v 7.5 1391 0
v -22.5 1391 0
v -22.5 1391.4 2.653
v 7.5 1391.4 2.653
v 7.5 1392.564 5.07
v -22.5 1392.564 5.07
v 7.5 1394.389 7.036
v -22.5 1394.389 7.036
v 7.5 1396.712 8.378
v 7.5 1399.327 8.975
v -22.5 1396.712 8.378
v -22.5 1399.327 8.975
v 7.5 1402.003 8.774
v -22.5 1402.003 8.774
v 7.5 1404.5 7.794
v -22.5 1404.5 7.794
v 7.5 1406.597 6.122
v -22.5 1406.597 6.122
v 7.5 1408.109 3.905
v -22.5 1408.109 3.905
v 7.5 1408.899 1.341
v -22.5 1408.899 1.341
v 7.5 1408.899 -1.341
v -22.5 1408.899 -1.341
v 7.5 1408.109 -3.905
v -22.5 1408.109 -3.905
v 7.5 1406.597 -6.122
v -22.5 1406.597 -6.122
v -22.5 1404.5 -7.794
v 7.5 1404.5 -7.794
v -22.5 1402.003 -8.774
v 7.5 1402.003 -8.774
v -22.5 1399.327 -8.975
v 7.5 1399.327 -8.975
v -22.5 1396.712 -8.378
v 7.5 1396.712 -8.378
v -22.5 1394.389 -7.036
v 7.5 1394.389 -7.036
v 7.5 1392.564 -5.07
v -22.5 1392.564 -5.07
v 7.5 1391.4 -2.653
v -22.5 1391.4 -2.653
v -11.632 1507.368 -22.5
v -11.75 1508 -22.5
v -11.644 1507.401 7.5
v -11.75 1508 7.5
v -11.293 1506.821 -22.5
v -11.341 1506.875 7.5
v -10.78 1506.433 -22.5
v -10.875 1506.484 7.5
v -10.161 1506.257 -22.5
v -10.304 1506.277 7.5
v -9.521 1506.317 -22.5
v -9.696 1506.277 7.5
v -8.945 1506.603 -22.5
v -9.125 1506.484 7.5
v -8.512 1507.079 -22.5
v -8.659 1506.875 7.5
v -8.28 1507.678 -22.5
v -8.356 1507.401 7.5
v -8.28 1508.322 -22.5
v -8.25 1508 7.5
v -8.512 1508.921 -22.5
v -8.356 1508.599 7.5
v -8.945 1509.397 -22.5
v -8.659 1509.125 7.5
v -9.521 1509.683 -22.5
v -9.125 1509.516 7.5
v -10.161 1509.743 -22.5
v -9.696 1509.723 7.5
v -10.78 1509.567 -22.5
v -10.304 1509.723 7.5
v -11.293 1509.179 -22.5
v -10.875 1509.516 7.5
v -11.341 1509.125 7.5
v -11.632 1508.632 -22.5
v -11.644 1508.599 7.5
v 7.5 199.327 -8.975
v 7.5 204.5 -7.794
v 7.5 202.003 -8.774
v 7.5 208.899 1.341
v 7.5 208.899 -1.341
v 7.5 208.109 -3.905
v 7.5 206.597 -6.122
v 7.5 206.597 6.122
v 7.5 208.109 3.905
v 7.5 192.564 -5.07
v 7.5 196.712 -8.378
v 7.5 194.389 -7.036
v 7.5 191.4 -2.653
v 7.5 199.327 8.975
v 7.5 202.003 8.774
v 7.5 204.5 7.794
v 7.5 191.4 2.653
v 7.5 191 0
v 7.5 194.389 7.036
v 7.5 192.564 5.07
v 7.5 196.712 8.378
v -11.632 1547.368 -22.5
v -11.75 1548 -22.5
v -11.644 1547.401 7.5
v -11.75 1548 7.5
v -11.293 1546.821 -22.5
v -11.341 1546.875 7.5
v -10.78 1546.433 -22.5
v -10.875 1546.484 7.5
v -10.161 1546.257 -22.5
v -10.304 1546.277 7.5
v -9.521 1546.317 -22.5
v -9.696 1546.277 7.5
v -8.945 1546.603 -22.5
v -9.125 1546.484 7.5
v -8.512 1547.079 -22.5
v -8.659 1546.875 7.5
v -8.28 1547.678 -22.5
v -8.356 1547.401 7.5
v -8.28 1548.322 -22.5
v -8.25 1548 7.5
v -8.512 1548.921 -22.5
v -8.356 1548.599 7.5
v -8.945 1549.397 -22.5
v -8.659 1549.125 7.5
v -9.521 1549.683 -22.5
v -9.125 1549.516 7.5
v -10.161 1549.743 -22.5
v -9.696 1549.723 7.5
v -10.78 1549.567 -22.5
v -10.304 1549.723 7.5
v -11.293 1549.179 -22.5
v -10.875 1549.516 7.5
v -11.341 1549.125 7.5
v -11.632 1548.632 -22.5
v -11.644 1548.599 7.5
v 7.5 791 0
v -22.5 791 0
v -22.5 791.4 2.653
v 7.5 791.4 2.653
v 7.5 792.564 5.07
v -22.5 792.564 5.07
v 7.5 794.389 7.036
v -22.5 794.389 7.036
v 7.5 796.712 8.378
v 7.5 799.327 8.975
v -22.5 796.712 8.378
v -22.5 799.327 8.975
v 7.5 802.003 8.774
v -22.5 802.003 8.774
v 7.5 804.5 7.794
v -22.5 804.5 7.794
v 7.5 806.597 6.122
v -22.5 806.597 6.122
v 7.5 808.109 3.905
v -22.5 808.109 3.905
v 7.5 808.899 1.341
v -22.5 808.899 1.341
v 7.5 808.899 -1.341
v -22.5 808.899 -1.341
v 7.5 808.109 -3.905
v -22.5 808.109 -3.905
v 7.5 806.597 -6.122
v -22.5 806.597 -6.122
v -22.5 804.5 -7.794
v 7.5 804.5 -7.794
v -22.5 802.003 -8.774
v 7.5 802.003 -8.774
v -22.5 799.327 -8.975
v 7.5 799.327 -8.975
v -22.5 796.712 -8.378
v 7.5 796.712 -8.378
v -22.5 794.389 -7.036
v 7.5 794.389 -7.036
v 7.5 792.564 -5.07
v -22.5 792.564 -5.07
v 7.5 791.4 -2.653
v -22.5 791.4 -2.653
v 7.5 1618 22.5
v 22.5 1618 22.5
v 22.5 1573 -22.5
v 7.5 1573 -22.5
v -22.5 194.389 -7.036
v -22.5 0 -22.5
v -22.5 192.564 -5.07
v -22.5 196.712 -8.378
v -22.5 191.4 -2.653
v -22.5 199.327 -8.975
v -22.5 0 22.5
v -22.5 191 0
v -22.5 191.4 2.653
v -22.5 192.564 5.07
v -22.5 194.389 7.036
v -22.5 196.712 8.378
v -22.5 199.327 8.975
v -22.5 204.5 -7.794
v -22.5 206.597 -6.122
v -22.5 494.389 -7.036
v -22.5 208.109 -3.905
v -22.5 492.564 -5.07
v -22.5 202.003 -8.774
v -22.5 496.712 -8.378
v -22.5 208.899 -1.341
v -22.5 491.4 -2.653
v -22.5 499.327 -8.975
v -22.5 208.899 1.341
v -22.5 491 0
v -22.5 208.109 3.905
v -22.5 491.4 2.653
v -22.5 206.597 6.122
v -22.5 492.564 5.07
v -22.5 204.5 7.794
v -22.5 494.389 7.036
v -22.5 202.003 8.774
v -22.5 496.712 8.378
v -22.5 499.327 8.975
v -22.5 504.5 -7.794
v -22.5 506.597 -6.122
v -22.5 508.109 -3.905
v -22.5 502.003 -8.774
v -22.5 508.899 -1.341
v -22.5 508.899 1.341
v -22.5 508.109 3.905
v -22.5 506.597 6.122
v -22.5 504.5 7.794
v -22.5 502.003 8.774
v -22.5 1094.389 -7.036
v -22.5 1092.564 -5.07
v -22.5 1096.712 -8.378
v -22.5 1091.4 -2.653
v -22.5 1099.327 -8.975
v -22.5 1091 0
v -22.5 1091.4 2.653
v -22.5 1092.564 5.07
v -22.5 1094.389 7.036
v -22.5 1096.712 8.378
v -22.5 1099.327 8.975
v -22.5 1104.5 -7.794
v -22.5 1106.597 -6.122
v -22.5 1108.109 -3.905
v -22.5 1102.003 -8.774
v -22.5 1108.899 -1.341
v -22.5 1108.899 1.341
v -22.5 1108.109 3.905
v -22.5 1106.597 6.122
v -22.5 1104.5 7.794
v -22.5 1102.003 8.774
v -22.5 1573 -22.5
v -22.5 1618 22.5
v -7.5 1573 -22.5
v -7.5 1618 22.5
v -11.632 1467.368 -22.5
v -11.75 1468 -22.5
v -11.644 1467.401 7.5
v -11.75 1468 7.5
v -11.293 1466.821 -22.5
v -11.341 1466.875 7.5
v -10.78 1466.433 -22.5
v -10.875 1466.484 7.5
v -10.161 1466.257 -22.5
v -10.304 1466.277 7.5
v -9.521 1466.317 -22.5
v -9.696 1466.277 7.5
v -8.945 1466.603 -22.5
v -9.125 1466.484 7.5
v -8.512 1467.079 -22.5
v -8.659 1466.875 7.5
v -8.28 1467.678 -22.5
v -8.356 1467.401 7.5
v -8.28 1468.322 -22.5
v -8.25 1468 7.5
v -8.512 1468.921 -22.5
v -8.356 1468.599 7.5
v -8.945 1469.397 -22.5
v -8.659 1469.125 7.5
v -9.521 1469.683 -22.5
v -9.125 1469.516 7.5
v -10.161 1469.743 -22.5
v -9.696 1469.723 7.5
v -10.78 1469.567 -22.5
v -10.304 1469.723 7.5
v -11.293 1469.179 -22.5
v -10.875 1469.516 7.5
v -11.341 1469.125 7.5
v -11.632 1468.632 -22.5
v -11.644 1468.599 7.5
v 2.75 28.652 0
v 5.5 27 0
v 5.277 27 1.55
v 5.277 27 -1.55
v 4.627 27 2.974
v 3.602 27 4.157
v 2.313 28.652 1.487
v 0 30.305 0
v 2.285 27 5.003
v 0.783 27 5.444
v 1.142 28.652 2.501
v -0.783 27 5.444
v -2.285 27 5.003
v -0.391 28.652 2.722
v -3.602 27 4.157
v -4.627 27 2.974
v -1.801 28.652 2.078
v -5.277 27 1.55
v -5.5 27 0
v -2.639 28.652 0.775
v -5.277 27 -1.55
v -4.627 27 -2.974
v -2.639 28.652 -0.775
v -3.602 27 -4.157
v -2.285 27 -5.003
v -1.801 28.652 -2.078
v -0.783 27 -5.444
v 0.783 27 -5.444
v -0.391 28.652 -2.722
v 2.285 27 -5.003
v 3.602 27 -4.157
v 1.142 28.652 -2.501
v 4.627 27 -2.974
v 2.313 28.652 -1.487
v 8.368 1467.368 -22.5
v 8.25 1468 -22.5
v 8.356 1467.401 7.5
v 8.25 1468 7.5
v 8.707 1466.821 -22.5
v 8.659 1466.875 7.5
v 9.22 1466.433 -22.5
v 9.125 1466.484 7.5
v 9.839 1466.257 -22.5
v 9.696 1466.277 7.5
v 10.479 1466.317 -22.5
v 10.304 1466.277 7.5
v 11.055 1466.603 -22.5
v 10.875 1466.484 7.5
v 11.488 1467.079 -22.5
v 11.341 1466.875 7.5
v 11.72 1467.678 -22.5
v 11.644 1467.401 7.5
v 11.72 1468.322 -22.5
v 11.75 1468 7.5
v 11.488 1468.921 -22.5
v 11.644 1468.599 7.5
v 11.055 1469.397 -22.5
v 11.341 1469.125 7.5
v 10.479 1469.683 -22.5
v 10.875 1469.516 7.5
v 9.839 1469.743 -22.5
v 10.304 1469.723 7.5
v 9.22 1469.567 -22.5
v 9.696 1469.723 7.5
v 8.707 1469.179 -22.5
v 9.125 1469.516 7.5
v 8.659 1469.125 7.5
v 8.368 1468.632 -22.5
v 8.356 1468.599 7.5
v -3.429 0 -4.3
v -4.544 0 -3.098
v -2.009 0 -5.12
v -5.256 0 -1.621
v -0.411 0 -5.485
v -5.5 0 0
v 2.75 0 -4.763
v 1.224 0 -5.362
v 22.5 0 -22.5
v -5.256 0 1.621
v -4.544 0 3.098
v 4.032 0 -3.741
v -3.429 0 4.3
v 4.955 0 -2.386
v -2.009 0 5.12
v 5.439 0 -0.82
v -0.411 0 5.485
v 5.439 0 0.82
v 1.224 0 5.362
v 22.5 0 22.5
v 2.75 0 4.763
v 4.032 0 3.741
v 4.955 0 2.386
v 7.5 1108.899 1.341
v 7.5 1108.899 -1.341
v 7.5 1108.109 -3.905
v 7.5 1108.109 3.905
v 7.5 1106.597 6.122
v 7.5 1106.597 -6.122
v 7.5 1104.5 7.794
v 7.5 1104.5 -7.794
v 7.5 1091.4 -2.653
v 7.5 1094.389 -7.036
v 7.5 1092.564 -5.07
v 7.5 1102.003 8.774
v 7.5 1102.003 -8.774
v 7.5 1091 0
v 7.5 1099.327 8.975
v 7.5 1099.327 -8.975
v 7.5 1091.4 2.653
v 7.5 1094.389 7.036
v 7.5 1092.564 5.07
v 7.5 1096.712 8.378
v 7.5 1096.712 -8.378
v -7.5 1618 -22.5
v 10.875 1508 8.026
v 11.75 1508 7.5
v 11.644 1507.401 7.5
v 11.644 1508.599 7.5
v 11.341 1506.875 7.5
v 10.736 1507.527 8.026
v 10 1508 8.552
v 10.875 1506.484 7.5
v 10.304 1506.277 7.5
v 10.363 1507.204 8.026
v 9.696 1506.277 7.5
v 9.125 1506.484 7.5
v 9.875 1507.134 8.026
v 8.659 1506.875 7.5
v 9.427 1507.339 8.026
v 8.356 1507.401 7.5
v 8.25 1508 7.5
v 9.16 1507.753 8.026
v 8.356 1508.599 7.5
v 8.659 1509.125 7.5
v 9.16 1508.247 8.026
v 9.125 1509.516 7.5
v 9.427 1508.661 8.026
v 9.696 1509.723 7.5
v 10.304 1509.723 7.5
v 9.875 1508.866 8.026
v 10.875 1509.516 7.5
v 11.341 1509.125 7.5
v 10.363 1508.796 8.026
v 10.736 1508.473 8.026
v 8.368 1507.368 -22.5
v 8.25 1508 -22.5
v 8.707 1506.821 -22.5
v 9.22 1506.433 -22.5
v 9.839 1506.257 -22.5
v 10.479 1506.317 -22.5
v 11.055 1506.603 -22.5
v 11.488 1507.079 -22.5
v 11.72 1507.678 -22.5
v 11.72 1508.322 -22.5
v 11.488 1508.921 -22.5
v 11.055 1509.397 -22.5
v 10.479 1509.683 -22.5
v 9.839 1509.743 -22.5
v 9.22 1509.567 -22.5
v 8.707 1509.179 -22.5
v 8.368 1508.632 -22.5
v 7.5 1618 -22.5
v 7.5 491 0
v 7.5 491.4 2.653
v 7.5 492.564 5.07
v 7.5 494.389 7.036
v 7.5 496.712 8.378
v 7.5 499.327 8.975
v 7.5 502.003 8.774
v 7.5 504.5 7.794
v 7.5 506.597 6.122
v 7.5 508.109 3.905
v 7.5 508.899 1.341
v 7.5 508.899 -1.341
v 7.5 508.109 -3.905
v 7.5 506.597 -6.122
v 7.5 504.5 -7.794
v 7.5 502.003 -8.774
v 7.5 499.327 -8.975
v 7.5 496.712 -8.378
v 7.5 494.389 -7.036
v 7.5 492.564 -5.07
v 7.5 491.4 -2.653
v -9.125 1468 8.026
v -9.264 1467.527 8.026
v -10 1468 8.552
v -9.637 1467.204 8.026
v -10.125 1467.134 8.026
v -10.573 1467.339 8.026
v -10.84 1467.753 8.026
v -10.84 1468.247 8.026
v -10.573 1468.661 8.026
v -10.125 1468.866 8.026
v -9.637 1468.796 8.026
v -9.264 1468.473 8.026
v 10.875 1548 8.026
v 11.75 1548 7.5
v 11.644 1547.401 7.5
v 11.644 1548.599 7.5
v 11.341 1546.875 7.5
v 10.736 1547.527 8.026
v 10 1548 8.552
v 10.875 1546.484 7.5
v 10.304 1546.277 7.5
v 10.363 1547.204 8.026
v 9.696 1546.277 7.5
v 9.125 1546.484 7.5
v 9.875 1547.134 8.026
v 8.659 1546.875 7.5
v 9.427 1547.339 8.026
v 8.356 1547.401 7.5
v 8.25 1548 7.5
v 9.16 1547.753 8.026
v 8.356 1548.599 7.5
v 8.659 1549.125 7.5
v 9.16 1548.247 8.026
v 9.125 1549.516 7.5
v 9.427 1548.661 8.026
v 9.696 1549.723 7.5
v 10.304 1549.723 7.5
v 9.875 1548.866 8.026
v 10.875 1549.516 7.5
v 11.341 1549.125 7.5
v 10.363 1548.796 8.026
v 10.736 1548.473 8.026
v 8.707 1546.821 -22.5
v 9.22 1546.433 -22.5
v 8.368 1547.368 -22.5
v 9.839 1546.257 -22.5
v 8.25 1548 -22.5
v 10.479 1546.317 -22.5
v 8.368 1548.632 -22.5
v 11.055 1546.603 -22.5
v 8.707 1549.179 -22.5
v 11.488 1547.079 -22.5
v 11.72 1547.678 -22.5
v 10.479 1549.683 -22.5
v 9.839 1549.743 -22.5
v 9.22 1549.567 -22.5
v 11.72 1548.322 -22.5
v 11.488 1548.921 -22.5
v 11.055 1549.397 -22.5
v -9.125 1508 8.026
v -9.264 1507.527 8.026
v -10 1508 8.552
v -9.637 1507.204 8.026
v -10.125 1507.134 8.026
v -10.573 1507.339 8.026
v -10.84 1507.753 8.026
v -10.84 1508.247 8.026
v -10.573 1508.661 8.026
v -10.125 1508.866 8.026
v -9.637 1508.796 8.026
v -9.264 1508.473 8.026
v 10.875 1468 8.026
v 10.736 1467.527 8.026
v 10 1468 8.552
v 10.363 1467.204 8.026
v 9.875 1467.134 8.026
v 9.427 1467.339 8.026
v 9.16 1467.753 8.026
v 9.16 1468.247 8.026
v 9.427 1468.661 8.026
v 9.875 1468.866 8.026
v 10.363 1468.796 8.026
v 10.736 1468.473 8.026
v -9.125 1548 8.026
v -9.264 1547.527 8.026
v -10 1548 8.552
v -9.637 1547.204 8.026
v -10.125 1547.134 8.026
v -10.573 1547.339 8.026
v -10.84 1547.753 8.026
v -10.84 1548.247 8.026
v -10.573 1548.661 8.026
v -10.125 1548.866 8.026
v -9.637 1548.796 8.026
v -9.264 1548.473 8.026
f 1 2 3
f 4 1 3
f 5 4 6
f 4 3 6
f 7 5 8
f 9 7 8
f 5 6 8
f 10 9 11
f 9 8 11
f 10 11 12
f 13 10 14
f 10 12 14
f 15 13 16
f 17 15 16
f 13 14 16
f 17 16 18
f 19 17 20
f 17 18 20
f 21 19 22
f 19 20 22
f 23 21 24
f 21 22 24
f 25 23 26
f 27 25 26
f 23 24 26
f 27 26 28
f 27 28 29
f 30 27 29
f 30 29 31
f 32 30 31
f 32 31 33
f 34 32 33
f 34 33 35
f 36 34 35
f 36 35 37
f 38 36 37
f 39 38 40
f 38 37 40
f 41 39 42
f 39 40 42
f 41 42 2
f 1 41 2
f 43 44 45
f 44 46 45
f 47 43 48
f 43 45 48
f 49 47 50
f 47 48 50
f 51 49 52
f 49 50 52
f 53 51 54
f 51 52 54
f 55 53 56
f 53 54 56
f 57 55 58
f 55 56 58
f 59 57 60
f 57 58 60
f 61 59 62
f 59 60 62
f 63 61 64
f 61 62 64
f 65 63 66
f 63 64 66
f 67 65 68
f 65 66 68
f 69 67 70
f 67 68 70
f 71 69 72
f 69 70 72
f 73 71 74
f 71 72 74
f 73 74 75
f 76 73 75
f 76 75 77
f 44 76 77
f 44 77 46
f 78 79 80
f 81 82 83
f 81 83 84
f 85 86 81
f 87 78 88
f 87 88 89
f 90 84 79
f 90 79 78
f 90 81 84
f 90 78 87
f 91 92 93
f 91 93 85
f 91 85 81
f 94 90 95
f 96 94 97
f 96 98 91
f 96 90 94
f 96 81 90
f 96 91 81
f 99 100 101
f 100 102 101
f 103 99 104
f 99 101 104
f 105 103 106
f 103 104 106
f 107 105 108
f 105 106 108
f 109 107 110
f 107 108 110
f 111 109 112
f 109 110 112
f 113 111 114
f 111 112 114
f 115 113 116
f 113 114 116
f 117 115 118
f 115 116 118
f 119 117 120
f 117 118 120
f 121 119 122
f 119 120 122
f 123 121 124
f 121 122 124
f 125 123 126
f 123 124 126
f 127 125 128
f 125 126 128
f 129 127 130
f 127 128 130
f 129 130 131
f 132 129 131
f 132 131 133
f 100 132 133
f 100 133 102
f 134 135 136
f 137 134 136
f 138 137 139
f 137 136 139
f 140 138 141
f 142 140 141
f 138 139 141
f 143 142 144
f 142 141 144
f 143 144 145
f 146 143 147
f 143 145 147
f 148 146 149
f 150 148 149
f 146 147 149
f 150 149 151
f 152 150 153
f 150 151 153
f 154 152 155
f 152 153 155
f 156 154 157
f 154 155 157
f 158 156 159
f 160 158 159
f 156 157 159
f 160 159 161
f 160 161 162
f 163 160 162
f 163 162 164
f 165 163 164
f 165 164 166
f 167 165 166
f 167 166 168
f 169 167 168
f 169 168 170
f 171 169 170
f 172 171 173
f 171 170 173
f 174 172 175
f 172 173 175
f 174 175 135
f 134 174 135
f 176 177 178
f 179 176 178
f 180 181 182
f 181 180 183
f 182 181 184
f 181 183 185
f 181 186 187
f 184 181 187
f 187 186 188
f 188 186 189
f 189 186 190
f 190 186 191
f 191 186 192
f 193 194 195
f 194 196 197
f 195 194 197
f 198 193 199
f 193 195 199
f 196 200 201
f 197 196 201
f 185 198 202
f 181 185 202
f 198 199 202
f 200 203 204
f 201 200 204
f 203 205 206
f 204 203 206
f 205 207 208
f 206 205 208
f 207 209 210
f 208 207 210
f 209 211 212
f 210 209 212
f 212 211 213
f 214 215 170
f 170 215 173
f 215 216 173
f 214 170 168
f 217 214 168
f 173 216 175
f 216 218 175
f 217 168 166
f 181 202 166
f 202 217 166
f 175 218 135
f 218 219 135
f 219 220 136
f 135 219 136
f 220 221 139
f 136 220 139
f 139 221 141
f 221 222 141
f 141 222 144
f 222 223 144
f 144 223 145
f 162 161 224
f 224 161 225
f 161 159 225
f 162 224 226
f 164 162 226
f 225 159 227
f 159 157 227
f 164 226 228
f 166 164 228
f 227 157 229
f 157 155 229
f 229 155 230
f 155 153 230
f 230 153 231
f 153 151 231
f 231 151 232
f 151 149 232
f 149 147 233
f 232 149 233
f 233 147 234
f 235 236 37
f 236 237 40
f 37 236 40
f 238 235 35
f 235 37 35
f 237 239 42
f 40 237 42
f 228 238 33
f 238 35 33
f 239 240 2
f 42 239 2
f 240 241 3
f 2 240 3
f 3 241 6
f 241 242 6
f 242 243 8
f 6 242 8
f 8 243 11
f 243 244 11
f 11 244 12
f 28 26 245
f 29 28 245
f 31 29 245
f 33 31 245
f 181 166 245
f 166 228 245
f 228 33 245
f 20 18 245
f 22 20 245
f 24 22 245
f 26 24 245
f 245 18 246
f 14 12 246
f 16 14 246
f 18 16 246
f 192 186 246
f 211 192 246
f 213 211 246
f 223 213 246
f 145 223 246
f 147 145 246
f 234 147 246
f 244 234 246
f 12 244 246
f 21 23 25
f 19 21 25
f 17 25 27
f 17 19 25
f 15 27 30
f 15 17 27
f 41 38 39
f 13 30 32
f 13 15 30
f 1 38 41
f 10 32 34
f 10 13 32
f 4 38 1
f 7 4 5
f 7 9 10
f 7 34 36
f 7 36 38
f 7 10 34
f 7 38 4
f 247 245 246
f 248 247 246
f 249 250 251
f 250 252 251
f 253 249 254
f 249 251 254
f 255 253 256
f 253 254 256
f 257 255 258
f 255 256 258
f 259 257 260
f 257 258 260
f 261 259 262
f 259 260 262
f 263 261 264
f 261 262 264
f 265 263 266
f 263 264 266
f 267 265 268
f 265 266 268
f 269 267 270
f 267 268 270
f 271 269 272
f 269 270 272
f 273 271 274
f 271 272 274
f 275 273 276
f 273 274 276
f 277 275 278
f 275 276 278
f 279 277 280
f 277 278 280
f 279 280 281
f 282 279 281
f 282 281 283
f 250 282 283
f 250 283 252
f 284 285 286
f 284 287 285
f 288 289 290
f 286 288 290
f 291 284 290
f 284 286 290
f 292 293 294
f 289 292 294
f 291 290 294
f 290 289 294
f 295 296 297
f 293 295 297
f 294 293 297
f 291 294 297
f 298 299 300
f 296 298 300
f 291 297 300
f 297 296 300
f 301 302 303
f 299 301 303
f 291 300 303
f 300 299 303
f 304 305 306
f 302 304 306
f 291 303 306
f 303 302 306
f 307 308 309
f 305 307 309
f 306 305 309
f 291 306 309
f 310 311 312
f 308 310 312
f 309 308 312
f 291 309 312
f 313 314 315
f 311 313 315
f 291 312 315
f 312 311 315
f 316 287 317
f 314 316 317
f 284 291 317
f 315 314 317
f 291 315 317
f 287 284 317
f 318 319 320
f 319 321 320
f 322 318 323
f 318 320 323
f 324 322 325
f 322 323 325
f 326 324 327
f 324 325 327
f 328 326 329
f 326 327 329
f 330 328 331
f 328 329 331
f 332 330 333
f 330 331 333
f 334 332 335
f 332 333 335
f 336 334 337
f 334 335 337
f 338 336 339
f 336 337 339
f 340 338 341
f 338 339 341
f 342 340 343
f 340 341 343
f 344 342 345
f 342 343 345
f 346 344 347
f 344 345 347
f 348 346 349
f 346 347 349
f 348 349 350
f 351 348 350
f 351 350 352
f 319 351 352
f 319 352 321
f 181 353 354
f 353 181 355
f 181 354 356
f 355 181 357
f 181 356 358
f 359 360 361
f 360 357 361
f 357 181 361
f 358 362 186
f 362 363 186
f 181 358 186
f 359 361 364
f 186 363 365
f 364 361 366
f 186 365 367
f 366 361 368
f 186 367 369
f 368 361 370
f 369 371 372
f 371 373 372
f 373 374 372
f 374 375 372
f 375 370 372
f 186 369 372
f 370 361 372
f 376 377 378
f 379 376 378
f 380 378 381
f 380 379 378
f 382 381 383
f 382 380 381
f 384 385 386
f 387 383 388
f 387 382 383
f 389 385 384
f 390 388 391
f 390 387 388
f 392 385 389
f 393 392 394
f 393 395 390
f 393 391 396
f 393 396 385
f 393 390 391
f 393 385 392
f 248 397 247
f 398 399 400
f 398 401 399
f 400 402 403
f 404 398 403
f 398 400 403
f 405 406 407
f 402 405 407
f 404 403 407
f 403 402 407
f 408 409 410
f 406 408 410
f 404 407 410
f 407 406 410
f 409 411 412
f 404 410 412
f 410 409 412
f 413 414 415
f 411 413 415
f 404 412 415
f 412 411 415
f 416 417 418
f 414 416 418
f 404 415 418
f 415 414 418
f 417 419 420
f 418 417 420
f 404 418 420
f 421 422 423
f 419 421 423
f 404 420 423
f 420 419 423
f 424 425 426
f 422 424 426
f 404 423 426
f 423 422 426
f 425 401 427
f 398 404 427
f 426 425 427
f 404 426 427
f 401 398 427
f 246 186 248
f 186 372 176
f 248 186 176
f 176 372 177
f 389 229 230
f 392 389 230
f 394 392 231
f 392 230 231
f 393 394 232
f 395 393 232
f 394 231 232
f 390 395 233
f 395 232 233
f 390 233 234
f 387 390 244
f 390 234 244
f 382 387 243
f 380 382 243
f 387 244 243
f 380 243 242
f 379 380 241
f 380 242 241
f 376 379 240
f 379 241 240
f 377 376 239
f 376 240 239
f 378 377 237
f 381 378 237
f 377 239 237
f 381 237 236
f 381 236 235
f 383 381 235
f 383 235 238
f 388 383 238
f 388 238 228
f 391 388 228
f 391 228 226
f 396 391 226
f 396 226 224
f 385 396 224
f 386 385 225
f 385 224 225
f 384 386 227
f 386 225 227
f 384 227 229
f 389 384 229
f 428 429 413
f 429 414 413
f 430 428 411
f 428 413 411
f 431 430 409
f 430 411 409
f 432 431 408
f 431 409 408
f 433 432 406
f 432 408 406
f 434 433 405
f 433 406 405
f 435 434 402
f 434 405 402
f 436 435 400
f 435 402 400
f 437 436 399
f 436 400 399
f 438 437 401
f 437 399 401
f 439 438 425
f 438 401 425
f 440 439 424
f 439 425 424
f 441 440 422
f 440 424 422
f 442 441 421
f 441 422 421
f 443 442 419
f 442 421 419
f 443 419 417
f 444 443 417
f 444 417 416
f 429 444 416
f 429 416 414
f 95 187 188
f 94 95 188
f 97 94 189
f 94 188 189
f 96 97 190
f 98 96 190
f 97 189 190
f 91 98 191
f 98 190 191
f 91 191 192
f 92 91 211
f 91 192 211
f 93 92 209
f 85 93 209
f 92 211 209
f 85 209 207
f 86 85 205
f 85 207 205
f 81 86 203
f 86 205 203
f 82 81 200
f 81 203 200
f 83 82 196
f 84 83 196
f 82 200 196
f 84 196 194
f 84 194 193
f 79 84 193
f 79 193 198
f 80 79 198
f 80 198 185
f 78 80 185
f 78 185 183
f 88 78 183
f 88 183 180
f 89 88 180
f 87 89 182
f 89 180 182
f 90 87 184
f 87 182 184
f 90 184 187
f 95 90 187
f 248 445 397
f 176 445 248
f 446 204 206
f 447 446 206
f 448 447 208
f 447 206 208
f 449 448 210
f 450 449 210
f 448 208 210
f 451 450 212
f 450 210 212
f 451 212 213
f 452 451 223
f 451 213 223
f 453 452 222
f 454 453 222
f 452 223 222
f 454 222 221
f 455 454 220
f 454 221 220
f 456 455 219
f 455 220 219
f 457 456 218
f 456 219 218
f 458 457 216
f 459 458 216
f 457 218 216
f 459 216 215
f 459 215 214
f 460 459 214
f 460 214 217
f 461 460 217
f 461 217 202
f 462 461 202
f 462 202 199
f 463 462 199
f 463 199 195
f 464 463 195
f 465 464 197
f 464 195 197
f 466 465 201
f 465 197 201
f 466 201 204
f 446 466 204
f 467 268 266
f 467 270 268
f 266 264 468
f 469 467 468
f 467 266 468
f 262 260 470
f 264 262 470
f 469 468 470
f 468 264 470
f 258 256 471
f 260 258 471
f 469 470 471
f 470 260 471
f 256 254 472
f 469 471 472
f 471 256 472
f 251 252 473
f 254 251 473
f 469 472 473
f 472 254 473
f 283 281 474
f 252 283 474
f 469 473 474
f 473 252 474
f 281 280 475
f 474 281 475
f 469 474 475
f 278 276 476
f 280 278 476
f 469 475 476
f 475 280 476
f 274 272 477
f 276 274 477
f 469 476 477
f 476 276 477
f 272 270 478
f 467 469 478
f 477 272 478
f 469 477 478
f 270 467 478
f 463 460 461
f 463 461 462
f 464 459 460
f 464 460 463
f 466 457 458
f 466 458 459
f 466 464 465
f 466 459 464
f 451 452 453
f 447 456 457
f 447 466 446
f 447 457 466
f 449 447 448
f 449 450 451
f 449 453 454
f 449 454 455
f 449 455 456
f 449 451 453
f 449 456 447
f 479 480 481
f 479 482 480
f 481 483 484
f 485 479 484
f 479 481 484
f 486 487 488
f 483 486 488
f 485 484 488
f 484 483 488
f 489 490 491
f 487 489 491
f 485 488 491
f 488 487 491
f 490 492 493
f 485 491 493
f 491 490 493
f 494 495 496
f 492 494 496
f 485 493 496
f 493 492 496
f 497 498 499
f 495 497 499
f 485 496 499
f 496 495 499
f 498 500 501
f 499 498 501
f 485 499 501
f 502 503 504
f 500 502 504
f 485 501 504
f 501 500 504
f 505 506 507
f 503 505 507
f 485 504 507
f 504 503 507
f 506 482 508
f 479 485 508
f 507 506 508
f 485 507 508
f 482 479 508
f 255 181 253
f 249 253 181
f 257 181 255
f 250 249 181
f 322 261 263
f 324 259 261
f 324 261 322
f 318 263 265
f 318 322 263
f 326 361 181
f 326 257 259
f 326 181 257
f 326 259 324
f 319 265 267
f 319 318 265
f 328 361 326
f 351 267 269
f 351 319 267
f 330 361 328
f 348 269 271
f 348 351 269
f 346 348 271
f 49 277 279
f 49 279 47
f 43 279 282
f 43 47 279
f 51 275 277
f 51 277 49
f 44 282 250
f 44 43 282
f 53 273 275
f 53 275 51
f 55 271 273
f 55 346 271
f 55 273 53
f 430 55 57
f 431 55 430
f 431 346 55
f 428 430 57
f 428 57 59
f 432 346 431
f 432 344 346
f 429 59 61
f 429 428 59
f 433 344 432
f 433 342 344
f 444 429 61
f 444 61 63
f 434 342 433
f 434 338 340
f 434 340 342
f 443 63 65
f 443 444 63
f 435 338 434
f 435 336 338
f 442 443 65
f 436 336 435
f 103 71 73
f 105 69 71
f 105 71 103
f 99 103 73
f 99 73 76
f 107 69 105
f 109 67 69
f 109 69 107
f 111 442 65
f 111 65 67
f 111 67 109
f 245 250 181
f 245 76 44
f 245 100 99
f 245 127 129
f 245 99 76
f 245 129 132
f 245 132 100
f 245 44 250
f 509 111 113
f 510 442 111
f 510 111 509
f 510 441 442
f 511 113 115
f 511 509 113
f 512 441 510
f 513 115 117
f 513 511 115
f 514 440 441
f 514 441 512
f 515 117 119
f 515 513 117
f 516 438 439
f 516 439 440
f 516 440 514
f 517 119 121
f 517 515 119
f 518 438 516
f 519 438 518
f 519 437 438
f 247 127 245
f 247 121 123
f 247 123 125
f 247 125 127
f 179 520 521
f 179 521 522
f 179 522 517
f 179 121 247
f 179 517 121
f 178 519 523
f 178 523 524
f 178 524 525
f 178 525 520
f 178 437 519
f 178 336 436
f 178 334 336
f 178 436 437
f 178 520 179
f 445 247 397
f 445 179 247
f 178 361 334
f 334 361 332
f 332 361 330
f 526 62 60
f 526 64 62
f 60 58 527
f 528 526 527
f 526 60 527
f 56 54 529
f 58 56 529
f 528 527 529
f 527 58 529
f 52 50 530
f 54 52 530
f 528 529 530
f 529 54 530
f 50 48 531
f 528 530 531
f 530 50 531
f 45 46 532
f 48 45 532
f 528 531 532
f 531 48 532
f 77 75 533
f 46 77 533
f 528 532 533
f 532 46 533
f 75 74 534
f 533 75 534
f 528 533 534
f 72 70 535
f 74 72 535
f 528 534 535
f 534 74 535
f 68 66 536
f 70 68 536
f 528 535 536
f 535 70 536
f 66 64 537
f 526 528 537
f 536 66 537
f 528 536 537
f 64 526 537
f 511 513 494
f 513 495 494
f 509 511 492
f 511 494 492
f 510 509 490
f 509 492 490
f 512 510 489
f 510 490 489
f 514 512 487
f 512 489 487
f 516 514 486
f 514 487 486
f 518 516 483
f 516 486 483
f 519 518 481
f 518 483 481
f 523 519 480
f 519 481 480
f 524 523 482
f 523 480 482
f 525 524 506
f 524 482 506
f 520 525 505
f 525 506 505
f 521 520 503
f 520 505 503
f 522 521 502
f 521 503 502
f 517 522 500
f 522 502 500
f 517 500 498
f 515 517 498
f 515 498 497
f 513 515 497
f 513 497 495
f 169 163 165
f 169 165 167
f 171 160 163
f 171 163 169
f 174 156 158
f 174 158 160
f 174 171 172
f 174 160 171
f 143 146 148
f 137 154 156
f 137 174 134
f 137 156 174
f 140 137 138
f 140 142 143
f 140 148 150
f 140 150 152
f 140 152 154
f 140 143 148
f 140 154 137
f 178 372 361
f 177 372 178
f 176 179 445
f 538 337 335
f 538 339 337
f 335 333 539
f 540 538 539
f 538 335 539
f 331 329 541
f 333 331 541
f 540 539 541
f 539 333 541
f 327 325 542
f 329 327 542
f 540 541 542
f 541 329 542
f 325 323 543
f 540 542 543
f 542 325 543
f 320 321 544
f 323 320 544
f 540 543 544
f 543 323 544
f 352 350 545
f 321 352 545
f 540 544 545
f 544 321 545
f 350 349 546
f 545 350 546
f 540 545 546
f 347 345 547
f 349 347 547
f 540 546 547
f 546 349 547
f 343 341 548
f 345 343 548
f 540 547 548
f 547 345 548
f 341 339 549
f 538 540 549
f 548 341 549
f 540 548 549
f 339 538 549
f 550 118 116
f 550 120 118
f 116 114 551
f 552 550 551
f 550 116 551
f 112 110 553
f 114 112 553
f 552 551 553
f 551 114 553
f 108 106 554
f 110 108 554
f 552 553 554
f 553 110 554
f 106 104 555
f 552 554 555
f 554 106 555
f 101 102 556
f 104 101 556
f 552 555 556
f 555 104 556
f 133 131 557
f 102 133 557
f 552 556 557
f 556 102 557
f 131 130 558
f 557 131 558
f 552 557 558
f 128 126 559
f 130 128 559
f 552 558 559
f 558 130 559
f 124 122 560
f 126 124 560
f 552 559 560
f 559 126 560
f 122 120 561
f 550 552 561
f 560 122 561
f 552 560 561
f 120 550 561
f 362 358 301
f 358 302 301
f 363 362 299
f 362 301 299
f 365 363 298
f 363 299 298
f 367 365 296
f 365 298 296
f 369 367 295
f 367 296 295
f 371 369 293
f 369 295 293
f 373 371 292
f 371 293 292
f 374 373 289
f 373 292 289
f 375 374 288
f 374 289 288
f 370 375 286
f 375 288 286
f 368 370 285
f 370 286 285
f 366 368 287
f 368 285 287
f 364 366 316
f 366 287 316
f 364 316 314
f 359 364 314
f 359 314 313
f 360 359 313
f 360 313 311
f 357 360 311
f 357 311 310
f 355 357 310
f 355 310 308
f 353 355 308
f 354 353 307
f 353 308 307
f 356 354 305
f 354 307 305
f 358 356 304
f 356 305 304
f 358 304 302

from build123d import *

# Parameters (mm, degrees)
F0_W      = 1618
F0_H      = 45
F1_DEPTH  = 22.5
F3_D      = 11
F3_DEPTH  = 27
F3_TIP    = 3.3047334047
F5_DEPTH  = 15
F7_DEPTH  = 15
F8_R      = 9
F9_DEPTH  = 30
F11_D     = 3.5
F11_DEPTH = 30
F11_TIP   = 1.0515060833


with BuildPart() as f1:
    # F0 (on Right) → F1 (new body, symmetric)
    with BuildSketch(Plane.YZ):
        with Locations((809, 0)):
            Rectangle(F0_W, F0_H)
    extrude(amount=F1_DEPTH, both=True)

    # F3
    with Locations(Plane.XZ):
        with Locations((0, 0)):
            Hole(F3_D / 2, depth=F3_DEPTH)
            with Locations((0, 0, -(F3_DEPTH + F3_TIP / 2))):  # 118° drill point
                Cone(0, F3_D / 2, F3_TIP, mode=Mode.SUBTRACT)

    # F4 (on face) → F5 (cut)
    with BuildSketch(Plane.YZ.offset(22.5)):
        Polygon((1618, -22.5), (1618, 22.5), (1573, -22.5), align=None)
    extrude(amount=-F5_DEPTH, mode=Mode.SUBTRACT)

    # F6 (on face) → F7 (cut)
    with BuildSketch(Plane(origin=(-22.5, 0, 0), x_dir=(0, -1, 0), z_dir=(-1, 0, 0))):
        Polygon((-1573, -22.5), (-1618, 22.5), (-1618, -22.5), align=None)
    extrude(amount=-F7_DEPTH, mode=Mode.SUBTRACT)

    # F8 (on face) → F9 (cut)
    with BuildSketch(Plane(origin=(-22.5, 0, 0), x_dir=(0, -1, 0), z_dir=(-1, 0, 0))):
        with Locations((-200, 0)):
            Circle(F8_R)
        with Locations((-500, 0)):
            Circle(F8_R)
        with Locations((-800, 0)):
            Circle(F8_R)
        with Locations((-1100, 0)):
            Circle(F8_R)
        with Locations((-1400, 0)):
            Circle(F8_R)
    extrude(amount=-F9_DEPTH, mode=Mode.SUBTRACT)

    # F11
    with Locations(Plane(origin=(0, 0, -22.5), x_dir=(1, 0, 0), z_dir=(0, 0, -1))):
        with Locations((10, -1548), (10, -1508), (10, -1468), (-10, -1468), (-10, -1508), (-10, -1548)):
            Hole(F11_D / 2, depth=F11_DEPTH)
            with Locations((0, 0, -(F11_DEPTH + F11_TIP / 2))):  # 118° drill point
                Cone(0, F11_D / 2, F11_TIP, mode=Mode.SUBTRACT)


solid = f1.part
